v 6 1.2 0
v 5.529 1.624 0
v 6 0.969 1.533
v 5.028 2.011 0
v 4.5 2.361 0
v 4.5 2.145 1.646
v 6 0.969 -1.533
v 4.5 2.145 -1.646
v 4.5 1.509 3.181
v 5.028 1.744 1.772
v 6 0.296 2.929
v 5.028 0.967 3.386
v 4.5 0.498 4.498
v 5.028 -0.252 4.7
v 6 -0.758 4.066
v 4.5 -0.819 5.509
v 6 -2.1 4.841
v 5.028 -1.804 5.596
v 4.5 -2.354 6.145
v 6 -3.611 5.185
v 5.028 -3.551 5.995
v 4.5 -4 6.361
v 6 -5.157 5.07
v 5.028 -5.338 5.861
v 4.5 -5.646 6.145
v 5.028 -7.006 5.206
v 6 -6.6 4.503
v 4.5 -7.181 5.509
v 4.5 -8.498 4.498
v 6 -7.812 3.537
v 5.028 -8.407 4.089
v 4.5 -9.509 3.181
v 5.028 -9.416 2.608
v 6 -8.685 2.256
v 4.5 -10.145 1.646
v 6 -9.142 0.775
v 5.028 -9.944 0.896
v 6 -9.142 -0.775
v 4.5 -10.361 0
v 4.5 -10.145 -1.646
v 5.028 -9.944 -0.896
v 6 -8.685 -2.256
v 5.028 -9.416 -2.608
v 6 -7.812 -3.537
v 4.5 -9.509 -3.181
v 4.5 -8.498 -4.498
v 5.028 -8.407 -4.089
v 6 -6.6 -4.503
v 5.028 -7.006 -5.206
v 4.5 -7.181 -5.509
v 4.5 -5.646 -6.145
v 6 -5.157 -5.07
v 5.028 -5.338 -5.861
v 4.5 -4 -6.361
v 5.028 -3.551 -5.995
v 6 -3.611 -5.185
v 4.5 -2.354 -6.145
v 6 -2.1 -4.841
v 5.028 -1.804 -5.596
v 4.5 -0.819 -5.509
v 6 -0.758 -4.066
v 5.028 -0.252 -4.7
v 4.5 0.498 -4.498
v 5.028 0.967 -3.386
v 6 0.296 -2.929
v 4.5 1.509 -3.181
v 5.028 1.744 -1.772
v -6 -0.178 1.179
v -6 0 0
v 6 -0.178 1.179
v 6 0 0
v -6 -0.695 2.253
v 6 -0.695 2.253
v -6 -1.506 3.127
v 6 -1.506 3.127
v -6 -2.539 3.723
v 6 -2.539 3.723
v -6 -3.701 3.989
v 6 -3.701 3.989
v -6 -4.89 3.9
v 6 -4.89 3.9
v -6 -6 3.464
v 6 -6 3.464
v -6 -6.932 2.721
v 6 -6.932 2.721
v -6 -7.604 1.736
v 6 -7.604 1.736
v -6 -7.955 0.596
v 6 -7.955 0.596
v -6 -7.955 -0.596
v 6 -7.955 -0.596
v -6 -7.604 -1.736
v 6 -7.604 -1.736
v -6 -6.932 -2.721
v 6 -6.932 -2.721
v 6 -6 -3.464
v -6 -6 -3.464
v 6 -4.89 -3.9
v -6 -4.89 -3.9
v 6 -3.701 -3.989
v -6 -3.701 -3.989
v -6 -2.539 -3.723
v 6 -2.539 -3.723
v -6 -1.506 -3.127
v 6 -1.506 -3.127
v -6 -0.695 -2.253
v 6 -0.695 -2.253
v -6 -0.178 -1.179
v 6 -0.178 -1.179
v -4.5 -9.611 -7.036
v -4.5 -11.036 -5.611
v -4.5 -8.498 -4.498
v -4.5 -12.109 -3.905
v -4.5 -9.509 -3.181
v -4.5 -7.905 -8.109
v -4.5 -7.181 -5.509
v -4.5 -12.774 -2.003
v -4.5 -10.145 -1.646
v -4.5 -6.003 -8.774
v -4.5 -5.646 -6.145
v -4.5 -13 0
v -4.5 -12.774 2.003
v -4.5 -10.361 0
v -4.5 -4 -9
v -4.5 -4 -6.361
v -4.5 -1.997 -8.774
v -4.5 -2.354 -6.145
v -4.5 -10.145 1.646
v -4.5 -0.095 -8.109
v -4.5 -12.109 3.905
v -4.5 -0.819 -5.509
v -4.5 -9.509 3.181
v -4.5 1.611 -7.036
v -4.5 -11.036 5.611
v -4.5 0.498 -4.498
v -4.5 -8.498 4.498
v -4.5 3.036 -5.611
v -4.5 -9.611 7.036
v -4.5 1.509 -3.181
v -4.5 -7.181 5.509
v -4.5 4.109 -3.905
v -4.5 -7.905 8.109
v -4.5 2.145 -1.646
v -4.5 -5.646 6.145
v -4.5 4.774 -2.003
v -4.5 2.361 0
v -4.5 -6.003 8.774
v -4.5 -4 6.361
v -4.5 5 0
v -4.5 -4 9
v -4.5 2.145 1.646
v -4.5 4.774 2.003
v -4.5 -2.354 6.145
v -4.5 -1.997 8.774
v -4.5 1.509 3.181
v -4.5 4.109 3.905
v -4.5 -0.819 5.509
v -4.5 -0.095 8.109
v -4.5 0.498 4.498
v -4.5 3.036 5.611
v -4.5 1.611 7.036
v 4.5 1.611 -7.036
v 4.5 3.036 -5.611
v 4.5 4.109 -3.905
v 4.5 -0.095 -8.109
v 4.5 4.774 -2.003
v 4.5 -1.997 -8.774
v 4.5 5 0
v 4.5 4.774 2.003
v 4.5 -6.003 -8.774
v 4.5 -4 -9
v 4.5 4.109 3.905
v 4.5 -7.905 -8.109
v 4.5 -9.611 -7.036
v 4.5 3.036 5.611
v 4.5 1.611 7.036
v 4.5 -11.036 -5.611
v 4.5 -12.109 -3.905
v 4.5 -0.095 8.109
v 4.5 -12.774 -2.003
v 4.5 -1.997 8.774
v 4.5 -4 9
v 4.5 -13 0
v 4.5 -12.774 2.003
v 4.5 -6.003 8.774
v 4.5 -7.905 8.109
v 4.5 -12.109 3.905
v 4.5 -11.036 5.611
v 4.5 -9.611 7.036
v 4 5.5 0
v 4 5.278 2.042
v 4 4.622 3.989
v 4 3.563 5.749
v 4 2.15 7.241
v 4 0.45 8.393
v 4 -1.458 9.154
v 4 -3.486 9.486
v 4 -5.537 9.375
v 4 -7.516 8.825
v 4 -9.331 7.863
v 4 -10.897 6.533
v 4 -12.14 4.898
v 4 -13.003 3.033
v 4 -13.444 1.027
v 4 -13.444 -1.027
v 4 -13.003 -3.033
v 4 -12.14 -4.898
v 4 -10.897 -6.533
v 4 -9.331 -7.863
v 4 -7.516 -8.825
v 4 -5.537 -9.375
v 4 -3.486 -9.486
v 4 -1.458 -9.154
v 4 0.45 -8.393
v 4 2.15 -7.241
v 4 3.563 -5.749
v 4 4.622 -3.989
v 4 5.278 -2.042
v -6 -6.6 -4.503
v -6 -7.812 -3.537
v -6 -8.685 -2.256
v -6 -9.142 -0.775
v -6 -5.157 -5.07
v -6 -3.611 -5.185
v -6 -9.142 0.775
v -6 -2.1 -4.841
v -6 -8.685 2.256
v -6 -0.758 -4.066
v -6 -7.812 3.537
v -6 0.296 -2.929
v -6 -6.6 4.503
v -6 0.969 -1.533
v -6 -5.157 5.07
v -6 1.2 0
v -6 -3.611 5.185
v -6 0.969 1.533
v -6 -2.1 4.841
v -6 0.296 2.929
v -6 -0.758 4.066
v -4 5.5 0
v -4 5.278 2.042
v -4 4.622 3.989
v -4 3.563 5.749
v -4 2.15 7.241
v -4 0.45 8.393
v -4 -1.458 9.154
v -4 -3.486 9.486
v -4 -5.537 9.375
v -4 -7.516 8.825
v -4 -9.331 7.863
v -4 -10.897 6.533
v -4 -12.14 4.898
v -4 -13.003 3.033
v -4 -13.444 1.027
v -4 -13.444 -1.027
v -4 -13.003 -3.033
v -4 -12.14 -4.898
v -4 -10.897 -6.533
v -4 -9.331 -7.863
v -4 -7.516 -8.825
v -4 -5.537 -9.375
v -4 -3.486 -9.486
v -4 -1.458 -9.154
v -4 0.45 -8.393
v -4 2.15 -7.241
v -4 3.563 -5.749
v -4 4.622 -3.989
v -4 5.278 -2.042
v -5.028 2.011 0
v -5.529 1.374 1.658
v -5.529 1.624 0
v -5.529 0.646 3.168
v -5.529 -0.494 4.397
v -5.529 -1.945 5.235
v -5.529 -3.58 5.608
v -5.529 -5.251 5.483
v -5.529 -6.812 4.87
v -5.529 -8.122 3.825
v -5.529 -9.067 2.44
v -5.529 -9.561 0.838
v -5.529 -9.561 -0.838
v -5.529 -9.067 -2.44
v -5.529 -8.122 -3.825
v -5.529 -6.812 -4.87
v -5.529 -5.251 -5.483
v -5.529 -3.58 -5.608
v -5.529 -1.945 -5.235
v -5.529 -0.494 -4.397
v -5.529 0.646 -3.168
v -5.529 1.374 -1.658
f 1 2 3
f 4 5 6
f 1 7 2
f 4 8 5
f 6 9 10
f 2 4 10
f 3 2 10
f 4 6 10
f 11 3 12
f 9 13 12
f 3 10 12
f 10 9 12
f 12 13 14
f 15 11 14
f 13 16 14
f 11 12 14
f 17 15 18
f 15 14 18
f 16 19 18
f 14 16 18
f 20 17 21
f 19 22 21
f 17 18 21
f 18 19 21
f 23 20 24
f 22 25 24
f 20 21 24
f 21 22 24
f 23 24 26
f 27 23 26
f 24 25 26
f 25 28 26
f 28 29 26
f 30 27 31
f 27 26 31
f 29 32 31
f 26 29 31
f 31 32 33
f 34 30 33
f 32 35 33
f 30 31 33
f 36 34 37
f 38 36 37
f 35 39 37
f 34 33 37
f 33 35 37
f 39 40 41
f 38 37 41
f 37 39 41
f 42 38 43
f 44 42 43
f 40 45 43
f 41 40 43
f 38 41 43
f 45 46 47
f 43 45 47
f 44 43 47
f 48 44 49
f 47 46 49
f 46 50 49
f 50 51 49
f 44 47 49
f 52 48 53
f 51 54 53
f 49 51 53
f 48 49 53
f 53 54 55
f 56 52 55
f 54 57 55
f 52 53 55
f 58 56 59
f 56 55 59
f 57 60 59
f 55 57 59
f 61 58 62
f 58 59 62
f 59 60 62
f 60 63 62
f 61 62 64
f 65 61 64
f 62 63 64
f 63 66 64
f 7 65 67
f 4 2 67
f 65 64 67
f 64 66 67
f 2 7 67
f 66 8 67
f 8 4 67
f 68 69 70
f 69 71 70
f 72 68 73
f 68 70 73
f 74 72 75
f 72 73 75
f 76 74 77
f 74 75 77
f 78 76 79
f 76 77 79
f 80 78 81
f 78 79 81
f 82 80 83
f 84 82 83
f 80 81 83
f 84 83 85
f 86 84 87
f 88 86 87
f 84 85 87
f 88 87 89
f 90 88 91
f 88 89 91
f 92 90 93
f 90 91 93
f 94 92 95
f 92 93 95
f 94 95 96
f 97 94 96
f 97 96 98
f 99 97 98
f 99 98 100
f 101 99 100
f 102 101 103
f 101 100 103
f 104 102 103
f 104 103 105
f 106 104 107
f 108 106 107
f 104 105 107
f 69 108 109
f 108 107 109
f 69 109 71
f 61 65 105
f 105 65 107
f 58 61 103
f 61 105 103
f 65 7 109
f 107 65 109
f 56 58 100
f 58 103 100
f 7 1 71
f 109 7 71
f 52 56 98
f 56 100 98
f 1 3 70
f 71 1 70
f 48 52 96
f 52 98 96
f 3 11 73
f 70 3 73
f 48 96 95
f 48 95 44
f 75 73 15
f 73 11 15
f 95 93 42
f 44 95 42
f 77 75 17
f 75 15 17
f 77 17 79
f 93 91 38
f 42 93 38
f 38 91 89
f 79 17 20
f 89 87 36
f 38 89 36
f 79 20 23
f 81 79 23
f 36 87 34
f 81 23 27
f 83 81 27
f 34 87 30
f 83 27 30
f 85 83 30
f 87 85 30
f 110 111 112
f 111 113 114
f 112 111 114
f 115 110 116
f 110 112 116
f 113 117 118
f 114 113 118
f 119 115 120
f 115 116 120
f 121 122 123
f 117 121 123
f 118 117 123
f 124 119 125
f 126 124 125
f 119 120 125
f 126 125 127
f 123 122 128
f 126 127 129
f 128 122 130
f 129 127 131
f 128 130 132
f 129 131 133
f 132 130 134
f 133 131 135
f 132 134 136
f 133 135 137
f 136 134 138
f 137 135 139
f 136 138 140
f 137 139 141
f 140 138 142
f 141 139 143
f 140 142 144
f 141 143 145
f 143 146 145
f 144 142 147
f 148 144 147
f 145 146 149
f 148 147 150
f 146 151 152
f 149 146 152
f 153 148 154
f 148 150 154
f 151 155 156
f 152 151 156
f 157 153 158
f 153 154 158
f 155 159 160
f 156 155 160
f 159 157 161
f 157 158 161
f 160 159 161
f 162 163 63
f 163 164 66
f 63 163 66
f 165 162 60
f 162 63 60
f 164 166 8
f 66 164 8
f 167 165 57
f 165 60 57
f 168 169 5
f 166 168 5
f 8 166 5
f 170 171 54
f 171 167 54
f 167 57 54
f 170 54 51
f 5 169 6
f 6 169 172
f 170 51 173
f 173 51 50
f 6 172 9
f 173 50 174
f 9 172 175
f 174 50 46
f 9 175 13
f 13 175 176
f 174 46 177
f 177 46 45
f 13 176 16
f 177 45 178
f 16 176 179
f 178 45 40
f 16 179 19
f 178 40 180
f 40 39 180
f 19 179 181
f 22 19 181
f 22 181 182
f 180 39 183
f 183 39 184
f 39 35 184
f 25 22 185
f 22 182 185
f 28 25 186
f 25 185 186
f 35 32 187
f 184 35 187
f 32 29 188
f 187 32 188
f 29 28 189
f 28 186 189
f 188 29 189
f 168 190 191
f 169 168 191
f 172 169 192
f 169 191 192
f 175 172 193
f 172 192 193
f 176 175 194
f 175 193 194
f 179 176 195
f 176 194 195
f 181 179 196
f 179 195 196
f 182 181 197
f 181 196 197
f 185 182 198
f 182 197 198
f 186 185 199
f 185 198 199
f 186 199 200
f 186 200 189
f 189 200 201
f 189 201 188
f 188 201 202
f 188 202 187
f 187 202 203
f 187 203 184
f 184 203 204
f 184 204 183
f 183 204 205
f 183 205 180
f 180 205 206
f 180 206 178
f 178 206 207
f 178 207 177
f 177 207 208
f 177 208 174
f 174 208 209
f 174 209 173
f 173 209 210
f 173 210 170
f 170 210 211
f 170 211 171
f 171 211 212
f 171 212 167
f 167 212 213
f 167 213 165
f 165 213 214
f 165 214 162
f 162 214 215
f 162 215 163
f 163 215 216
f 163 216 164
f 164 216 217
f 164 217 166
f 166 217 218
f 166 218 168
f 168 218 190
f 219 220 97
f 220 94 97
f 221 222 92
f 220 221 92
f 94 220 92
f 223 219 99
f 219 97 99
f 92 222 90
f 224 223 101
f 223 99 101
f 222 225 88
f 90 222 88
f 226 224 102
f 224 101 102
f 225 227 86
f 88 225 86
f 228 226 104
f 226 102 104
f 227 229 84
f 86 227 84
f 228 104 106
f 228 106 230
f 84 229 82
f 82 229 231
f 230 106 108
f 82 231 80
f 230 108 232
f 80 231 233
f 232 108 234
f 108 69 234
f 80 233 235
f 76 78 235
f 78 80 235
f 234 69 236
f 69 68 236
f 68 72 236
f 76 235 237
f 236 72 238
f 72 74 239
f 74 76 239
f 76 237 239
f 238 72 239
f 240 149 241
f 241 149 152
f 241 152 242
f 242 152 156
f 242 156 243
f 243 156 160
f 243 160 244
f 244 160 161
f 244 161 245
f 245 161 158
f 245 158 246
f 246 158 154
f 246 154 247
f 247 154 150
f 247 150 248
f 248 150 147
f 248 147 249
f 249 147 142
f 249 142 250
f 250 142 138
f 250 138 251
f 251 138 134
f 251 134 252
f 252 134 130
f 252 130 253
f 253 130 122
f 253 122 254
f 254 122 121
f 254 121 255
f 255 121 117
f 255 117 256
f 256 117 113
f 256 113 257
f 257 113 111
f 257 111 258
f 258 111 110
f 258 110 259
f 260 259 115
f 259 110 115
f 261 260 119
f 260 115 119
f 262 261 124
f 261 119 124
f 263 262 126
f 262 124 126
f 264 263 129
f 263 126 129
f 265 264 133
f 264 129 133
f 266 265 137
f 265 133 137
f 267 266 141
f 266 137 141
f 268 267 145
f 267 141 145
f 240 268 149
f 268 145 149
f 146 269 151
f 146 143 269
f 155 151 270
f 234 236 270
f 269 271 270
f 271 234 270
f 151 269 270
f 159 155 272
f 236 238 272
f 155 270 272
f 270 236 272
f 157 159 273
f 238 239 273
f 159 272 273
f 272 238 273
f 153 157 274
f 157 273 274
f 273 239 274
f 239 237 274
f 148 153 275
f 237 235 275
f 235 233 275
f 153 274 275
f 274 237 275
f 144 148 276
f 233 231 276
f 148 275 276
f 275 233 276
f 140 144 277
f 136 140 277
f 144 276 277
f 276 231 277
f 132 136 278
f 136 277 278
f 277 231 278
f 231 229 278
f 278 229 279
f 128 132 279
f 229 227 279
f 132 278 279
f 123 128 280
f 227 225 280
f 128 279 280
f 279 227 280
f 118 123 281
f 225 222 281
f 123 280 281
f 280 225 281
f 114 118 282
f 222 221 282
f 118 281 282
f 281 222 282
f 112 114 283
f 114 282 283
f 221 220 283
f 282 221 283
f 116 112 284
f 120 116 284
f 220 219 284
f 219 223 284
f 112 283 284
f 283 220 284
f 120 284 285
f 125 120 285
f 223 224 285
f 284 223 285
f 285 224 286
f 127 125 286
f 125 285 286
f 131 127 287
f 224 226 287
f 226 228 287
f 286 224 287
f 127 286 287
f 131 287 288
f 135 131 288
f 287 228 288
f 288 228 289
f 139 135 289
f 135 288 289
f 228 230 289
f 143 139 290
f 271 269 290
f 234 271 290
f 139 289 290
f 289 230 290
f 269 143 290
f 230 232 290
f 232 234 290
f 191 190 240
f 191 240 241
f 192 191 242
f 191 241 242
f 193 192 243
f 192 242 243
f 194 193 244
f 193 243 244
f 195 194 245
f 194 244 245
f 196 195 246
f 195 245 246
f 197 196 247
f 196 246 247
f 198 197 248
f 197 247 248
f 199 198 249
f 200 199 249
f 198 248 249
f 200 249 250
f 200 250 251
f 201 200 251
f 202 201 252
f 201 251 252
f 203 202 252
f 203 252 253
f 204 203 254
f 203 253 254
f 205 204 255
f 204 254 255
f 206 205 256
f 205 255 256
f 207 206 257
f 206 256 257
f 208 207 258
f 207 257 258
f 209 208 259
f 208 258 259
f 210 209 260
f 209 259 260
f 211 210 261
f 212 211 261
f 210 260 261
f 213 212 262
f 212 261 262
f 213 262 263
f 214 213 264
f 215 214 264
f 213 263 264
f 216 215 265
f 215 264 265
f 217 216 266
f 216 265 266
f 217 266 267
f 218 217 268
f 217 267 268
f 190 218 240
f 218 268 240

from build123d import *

# Parameters (mm, degrees)
SFAZOWANIE1_SIZE = 0.5


with BuildPart() as part:
    # Szkic1 → Obrót1 (revolve)
    with BuildSketch(Plane.XY):
        with BuildLine():
            Line((-6, 0), (6, 0))
            Line((6, 0), (6, 1.2))
            ThreePointArc((6, 1.2), (5.282017059, 1.822044839), (4.5, 2.361385739))
            Line((4.5, 2.361385739), (4.5, 5.5))
            Line((4.5, 5.5), (-4.5, 5.5))
            Line((-4.5, 5.5), (-4.5, 2.361385739))
            ThreePointArc((-4.5, 2.361385739), (-5.282017059, 1.822044839), (-6, 1.2))
            Line((-6, 1.2), (-6, 0))
        make_face()
    revolve(axis=Axis((-11.261323988, -4, 0), (1, 0, 0)))

    # Sfazowanie1
    sfazowanie1_edges = [part.edges().sort_by_distance(p)[0] for p in [
        (-4.5, -13.5, 0),
        (4.5, -13.5, 0),
    ]]
    chamfer(sfazowanie1_edges, length=SFAZOWANIE1_SIZE)


solid = part.part
